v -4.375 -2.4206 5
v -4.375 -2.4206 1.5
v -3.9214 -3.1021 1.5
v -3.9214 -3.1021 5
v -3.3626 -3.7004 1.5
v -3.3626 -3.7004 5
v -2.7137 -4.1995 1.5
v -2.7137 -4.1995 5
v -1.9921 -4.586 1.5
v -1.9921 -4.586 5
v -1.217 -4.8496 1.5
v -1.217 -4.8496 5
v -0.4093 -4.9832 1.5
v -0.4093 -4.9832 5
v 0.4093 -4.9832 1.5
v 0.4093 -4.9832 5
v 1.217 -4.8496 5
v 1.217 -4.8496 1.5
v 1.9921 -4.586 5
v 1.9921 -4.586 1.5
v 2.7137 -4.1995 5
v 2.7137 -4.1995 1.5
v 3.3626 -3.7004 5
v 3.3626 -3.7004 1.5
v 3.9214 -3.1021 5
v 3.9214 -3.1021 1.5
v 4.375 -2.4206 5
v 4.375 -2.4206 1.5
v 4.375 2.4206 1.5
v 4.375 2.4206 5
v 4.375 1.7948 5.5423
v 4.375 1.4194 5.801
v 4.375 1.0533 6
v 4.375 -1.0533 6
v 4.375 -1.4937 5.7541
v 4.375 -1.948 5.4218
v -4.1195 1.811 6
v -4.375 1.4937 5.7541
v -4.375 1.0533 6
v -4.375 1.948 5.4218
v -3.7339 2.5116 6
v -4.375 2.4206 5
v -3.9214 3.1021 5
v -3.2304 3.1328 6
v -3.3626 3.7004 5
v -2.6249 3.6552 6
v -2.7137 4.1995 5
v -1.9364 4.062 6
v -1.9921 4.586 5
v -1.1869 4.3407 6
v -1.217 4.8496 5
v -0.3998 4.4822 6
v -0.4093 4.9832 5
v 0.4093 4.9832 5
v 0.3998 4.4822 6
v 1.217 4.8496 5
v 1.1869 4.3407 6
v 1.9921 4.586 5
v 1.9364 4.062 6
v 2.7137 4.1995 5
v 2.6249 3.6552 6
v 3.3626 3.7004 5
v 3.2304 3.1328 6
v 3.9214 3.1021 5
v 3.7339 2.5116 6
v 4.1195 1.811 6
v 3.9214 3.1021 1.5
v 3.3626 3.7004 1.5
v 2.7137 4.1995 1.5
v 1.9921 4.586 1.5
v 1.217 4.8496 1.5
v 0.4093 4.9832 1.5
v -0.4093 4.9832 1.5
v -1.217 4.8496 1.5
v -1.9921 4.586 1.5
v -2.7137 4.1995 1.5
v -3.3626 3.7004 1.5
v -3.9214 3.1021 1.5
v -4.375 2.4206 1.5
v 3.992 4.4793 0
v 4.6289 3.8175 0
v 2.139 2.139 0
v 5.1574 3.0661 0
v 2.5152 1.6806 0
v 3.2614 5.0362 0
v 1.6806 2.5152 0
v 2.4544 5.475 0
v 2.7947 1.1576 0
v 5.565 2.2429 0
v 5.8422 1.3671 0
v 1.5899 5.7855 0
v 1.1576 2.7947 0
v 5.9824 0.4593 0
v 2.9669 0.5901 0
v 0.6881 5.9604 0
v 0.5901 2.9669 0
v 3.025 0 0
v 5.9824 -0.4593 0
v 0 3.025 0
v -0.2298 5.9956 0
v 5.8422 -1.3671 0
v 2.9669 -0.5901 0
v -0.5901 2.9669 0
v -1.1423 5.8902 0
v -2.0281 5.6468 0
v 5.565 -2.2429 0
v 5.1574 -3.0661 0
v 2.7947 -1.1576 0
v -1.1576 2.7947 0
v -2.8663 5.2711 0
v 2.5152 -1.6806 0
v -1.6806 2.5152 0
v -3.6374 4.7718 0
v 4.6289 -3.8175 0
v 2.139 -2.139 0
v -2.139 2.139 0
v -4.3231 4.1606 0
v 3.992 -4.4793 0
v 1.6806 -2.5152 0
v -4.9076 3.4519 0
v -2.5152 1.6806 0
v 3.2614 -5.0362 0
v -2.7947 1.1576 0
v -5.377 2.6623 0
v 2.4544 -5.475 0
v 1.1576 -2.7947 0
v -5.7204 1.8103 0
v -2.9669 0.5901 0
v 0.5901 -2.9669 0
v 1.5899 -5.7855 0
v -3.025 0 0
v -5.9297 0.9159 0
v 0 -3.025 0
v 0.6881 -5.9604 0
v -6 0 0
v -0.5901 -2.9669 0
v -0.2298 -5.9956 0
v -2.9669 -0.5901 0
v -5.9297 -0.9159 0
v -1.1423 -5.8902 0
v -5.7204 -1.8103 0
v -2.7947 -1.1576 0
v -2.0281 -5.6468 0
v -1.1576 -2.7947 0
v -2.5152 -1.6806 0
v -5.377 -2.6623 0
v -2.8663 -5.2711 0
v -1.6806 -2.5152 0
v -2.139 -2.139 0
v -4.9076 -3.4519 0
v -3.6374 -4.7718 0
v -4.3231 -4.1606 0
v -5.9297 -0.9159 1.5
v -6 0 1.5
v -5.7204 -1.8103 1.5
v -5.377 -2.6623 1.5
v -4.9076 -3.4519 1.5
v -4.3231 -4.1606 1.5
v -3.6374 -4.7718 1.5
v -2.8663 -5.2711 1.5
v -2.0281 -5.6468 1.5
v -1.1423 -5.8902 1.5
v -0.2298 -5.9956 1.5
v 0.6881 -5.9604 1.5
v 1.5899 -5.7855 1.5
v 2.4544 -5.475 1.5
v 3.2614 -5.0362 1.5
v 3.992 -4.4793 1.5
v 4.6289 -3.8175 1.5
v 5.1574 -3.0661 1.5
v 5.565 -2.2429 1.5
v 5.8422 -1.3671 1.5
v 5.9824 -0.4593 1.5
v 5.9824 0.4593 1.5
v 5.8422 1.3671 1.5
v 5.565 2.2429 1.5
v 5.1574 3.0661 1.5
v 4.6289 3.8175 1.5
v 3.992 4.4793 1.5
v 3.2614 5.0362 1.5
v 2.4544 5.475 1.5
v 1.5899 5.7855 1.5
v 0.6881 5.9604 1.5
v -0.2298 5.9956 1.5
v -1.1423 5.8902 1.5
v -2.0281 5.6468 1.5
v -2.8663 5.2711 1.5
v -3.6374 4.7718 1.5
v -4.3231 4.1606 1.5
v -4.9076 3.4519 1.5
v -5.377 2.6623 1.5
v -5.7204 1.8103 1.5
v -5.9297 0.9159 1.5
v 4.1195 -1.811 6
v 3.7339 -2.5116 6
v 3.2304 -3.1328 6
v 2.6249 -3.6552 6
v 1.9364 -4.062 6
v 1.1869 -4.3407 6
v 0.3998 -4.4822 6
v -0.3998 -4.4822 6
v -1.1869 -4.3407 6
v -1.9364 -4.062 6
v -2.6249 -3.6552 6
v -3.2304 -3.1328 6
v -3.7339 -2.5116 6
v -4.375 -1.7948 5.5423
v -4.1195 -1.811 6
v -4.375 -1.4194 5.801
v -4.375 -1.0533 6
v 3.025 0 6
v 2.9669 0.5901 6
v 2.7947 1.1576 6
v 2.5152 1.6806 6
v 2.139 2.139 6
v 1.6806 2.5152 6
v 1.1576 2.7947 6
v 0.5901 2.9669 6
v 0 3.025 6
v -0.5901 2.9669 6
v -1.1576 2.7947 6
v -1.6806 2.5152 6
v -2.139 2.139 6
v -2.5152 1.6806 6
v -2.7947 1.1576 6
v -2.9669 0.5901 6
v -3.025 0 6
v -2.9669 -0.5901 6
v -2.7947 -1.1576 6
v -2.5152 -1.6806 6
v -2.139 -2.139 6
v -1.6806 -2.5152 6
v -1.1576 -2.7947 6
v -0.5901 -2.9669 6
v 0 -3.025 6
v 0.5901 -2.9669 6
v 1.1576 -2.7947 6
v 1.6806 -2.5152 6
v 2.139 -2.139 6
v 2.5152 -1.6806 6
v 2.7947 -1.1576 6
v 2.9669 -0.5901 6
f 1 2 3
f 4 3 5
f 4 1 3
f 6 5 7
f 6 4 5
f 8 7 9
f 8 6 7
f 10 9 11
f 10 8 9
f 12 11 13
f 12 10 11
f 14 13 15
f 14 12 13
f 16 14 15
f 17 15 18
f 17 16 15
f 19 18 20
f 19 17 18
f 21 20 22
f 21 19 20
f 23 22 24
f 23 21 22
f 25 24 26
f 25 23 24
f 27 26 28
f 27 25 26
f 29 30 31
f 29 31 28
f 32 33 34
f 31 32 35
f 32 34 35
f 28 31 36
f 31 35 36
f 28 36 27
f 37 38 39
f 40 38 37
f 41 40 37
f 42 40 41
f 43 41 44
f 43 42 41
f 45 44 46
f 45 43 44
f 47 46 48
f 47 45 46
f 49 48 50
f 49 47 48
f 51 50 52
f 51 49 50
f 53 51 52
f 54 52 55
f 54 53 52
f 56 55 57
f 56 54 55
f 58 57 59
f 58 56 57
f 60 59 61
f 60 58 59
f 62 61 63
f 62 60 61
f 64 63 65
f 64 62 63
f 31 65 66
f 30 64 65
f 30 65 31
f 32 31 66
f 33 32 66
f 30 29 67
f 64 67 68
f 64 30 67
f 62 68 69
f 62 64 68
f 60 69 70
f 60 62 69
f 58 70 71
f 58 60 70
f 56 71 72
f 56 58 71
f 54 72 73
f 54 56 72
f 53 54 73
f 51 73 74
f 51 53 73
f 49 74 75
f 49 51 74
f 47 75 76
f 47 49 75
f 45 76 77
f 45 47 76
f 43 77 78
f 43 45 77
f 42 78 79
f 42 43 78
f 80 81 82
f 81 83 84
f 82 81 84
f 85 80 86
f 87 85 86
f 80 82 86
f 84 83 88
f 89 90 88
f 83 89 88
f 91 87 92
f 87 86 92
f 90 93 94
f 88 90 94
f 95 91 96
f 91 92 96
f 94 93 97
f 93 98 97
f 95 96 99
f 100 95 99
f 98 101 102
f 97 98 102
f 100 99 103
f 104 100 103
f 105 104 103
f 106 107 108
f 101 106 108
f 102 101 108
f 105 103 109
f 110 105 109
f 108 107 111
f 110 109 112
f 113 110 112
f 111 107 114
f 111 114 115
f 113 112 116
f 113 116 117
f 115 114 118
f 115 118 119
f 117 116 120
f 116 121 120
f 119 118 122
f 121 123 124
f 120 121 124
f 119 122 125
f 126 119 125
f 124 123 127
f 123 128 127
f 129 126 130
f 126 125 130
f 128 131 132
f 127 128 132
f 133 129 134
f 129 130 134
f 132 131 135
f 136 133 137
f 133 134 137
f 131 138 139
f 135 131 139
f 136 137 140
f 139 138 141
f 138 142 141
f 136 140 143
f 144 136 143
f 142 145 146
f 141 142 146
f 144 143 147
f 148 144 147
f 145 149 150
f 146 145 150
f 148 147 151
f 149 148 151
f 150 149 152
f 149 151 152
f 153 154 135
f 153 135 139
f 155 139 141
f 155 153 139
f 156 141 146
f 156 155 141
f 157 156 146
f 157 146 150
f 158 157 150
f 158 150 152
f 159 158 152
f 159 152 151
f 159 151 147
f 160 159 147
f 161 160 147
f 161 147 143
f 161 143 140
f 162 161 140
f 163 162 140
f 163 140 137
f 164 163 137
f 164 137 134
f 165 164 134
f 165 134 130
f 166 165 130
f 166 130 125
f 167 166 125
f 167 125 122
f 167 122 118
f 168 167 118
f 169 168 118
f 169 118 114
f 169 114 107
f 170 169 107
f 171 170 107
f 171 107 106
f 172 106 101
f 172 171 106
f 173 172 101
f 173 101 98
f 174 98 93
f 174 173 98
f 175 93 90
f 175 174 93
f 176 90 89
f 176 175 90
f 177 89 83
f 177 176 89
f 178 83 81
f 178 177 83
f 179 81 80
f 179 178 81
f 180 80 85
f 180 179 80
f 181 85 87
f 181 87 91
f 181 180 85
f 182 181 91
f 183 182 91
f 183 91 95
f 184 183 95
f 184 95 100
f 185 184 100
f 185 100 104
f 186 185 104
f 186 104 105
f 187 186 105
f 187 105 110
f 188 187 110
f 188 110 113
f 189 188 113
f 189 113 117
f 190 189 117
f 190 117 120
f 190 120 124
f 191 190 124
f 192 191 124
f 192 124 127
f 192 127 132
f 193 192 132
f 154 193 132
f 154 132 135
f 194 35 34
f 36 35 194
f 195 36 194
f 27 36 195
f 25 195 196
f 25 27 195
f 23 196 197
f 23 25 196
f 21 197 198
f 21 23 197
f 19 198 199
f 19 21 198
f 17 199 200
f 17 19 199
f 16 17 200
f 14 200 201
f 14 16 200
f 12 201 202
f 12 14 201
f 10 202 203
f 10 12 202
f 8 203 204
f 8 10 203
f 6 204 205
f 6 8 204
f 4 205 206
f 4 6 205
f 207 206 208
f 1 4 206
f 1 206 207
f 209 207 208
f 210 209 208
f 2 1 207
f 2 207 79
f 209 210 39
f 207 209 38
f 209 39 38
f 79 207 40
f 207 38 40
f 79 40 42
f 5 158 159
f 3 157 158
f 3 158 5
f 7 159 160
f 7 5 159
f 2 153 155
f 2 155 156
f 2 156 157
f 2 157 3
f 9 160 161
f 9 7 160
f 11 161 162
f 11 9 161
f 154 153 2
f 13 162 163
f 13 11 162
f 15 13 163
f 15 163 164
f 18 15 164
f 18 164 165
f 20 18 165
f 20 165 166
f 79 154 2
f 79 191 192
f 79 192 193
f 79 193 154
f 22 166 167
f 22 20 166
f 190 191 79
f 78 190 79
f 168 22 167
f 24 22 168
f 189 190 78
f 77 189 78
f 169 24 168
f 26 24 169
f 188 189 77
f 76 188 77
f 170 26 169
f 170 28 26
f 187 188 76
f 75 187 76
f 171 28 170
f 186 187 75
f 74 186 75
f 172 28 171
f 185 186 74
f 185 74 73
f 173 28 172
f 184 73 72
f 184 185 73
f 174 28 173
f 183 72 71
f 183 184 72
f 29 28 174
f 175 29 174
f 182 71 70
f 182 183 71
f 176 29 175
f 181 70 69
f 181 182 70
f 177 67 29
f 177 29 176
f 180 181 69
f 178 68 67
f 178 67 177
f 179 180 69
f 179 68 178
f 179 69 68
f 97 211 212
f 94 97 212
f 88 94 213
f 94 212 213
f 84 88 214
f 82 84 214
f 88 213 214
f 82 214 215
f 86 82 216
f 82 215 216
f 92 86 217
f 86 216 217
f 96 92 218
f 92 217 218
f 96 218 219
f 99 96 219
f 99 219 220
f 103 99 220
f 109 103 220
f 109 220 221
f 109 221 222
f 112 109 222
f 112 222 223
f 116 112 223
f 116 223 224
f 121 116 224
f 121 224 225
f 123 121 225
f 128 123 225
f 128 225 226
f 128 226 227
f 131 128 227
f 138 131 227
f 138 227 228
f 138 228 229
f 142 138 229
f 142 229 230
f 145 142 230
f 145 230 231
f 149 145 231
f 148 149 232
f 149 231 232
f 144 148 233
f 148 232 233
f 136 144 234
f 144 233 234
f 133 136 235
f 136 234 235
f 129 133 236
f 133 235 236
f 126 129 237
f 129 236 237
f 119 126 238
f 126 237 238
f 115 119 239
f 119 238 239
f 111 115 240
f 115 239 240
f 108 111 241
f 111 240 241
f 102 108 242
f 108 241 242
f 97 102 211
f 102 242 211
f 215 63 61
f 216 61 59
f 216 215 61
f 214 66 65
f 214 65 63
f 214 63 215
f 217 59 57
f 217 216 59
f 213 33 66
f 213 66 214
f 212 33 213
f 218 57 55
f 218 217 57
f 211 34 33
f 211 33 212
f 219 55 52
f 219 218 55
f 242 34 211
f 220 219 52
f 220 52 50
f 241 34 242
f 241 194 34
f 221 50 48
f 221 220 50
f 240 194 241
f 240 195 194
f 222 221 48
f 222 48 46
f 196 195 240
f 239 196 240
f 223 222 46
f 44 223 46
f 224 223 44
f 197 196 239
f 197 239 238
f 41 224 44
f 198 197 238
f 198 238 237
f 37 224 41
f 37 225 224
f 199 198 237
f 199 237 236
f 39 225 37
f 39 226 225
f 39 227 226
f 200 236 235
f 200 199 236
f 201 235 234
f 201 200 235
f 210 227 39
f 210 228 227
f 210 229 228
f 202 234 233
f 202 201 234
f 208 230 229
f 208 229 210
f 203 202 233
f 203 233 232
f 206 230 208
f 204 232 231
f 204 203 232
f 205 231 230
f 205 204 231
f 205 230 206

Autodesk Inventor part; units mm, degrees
ref_plane "YZ Plane" through (0, 0, 0) normal (1, 0, 0) x (0, 1, 0)
ref_plane "XZ Plane" through (0, 0, 0) normal (0, 1, 0) x (-1, 0, 0)
ref_plane "XY Plane" through (0, 0, 0) normal (0, 0, 1) x (1, 0, 0)
sketch "スケッチ1" plane through (0, 0, 0) normal (0, 1, 0) x (-1, 0, 0)
  line L0 (3, 0) -> (6, 0)
  line L1 (6, 0) -> (6, 1.5)
  line L2 (6, 1.5) -> (5, 1.5)
  line L3 (5, 1.5) -> (5, 5)
  line L4 (4.5, 6) -> (3, 6)
  line L5 (3, 6) -> (3, 0)
  line L6 (5, 5) -> (4.5, 6)
  line L7 (0, -1.2) -> (0, 7.2) projected
  point P0 (0, 0)
  point P1 (3, 6)
  dimension "d5" = 1.5
  dimension "d9" = 1
  dimension "d10" = 0.5
  dimension "d17" = 10
  dimension "d18" = 12
  dimension "d19" = 6
  dimension "d20" = 6
revolve "回転1" add sketch "スケッチ1" angle 360 about axis through (0, 0, -10) along (0, 0, 1)
sketch "スケッチ2" plane through (0, 0, 6) normal (0, 0, 1) x (1, 0, 0)
  line L0 (4.4, -2.3749) -> (-4.4, -2.3749)
  line L1 (-4.4, -2.3749) -> (-4.4, 2.3749)
  line L2 (-4.4, 2.3749) -> (4.4, 2.3749)
  line L3 (4.4, 2.3749) -> (4.4, -2.3749)
  line L4 (4.4, -2.3749) -> (-4.4, 2.3749) construction
  line L5 (-4.4, -2.3749) -> (4.4, 2.3749) construction
  circle A0 centre (0, 0) radius 5
  point P0 (0, 0)
  dimension "d12" = 10
  dimension "d11" = 8.8
extrude "押し出し1" cut sketch "スケッチ2" against normal up to surface (4.5 mm away) contours L3 A0 | A0 L1
sketch "스케치3" plane through (0, 0, 6) normal (0, 0, 1) x (1, 0, 0)
  circle A0 centre (0, 0) radius 3 projected
  line L0 (4.4, -0.9434) -> (4.4, 0.9434) projected
  arc A1 (4.4, 0.9434) -> (-4.4, 0.9434) centre (0, 0) ccw projected
  line L1 (-4.4, 0.9434) -> (-4.4, -0.9434) projected
  arc A2 (-4.4, -0.9434) -> (4.4, -0.9434) centre (0, 0) ccw projected
  circle A3 centre (0, 0) radius 3.025
  dimension "d21" = 6.05
extrude "돌출2" cut sketch "스케치3" against normal up to surface (6 mm away) contours A0 | A3
sketch "스케치4" plane through (0, 0, 6) normal (0, 0, 1) x (1, 0, 0)
  circle A0 centre (0, 0) radius 3.025 projected
  line L0 (4.4, -0.9434) -> (4.4, 0.9434) projected
  arc A1 (4.4, 0.9434) -> (-4.4, 0.9434) centre (0, 0) ccw projected
  line L1 (-4.4, 0.9434) -> (-4.4, -0.9434) projected
  arc A2 (-4.4, -0.9434) -> (4.4, -0.9434) centre (0, 0) ccw projected
  line L2 (4.4, 0.9434) -> (4.4, 2.3749) projected
  arc A3 (4.4, 2.3749) -> (-4.4, 2.3749) centre (0, 0) ccw projected
  line L3 (-4.4, 2.3749) -> (-4.4, 0.9434) projected
  arc A4 (4.4, 0.9434) -> (-4.4, 0.9434) centre (0, 0) ccw projected
  line L4 (4.4, -2.3749) -> (4.4, -0.9434) projected
  arc A5 (-4.4, -0.9434) -> (4.4, -0.9434) centre (0, 0) ccw projected
  line L5 (-4.4, -0.9434) -> (-4.4, -2.3749) projected
  arc A6 (-4.4, -2.3749) -> (4.4, -2.3749) centre (0, 0) ccw projected
  arc A7 (4.375, 0.9407) -> (-4.375, 0.9407) centre (0, 0) ccw
  line L6 (4.375, 2.4206) -> (4.375, -2.4206)
  arc A8 (-4.375, -0.9407) -> (4.375, -0.9407) centre (0, 0) ccw
  line L7 (-4.375, -2.4206) -> (-4.375, 2.4206)
  point P0 (-4.35, 2.4653)
  point P1 (-4.35, -2.4653)
  point P2 (4.35, 2.4653)
  point P3 (4.35, -2.4653)
  point P4 (4.4, -0.9434)
  point P5 (4.4, 0.9434)
  point P6 (-4.4, 0.9434)
  point P7 (-4.4, -0.9434)
  point P8 (-4.4, 0.9434)
  point P9 (4.4, 0.9434)
  point P10 (-4.4, -0.9434)
  point P11 (4.4, -0.9434)
  dimension "d27" = 0.025
extrude "돌출3" cut sketch "스케치4" against normal up to surface (4.5 mm away) contours A2 L6 A1 L0 | L4 A6 L6 A2 | A1 L6 A3 L2 | L7 A6 L5 A2 | A2 L1 A1 L7 | A1 L3 A3 L7
properties part number "LED-0606" material "アセタール樹脂、黒"
